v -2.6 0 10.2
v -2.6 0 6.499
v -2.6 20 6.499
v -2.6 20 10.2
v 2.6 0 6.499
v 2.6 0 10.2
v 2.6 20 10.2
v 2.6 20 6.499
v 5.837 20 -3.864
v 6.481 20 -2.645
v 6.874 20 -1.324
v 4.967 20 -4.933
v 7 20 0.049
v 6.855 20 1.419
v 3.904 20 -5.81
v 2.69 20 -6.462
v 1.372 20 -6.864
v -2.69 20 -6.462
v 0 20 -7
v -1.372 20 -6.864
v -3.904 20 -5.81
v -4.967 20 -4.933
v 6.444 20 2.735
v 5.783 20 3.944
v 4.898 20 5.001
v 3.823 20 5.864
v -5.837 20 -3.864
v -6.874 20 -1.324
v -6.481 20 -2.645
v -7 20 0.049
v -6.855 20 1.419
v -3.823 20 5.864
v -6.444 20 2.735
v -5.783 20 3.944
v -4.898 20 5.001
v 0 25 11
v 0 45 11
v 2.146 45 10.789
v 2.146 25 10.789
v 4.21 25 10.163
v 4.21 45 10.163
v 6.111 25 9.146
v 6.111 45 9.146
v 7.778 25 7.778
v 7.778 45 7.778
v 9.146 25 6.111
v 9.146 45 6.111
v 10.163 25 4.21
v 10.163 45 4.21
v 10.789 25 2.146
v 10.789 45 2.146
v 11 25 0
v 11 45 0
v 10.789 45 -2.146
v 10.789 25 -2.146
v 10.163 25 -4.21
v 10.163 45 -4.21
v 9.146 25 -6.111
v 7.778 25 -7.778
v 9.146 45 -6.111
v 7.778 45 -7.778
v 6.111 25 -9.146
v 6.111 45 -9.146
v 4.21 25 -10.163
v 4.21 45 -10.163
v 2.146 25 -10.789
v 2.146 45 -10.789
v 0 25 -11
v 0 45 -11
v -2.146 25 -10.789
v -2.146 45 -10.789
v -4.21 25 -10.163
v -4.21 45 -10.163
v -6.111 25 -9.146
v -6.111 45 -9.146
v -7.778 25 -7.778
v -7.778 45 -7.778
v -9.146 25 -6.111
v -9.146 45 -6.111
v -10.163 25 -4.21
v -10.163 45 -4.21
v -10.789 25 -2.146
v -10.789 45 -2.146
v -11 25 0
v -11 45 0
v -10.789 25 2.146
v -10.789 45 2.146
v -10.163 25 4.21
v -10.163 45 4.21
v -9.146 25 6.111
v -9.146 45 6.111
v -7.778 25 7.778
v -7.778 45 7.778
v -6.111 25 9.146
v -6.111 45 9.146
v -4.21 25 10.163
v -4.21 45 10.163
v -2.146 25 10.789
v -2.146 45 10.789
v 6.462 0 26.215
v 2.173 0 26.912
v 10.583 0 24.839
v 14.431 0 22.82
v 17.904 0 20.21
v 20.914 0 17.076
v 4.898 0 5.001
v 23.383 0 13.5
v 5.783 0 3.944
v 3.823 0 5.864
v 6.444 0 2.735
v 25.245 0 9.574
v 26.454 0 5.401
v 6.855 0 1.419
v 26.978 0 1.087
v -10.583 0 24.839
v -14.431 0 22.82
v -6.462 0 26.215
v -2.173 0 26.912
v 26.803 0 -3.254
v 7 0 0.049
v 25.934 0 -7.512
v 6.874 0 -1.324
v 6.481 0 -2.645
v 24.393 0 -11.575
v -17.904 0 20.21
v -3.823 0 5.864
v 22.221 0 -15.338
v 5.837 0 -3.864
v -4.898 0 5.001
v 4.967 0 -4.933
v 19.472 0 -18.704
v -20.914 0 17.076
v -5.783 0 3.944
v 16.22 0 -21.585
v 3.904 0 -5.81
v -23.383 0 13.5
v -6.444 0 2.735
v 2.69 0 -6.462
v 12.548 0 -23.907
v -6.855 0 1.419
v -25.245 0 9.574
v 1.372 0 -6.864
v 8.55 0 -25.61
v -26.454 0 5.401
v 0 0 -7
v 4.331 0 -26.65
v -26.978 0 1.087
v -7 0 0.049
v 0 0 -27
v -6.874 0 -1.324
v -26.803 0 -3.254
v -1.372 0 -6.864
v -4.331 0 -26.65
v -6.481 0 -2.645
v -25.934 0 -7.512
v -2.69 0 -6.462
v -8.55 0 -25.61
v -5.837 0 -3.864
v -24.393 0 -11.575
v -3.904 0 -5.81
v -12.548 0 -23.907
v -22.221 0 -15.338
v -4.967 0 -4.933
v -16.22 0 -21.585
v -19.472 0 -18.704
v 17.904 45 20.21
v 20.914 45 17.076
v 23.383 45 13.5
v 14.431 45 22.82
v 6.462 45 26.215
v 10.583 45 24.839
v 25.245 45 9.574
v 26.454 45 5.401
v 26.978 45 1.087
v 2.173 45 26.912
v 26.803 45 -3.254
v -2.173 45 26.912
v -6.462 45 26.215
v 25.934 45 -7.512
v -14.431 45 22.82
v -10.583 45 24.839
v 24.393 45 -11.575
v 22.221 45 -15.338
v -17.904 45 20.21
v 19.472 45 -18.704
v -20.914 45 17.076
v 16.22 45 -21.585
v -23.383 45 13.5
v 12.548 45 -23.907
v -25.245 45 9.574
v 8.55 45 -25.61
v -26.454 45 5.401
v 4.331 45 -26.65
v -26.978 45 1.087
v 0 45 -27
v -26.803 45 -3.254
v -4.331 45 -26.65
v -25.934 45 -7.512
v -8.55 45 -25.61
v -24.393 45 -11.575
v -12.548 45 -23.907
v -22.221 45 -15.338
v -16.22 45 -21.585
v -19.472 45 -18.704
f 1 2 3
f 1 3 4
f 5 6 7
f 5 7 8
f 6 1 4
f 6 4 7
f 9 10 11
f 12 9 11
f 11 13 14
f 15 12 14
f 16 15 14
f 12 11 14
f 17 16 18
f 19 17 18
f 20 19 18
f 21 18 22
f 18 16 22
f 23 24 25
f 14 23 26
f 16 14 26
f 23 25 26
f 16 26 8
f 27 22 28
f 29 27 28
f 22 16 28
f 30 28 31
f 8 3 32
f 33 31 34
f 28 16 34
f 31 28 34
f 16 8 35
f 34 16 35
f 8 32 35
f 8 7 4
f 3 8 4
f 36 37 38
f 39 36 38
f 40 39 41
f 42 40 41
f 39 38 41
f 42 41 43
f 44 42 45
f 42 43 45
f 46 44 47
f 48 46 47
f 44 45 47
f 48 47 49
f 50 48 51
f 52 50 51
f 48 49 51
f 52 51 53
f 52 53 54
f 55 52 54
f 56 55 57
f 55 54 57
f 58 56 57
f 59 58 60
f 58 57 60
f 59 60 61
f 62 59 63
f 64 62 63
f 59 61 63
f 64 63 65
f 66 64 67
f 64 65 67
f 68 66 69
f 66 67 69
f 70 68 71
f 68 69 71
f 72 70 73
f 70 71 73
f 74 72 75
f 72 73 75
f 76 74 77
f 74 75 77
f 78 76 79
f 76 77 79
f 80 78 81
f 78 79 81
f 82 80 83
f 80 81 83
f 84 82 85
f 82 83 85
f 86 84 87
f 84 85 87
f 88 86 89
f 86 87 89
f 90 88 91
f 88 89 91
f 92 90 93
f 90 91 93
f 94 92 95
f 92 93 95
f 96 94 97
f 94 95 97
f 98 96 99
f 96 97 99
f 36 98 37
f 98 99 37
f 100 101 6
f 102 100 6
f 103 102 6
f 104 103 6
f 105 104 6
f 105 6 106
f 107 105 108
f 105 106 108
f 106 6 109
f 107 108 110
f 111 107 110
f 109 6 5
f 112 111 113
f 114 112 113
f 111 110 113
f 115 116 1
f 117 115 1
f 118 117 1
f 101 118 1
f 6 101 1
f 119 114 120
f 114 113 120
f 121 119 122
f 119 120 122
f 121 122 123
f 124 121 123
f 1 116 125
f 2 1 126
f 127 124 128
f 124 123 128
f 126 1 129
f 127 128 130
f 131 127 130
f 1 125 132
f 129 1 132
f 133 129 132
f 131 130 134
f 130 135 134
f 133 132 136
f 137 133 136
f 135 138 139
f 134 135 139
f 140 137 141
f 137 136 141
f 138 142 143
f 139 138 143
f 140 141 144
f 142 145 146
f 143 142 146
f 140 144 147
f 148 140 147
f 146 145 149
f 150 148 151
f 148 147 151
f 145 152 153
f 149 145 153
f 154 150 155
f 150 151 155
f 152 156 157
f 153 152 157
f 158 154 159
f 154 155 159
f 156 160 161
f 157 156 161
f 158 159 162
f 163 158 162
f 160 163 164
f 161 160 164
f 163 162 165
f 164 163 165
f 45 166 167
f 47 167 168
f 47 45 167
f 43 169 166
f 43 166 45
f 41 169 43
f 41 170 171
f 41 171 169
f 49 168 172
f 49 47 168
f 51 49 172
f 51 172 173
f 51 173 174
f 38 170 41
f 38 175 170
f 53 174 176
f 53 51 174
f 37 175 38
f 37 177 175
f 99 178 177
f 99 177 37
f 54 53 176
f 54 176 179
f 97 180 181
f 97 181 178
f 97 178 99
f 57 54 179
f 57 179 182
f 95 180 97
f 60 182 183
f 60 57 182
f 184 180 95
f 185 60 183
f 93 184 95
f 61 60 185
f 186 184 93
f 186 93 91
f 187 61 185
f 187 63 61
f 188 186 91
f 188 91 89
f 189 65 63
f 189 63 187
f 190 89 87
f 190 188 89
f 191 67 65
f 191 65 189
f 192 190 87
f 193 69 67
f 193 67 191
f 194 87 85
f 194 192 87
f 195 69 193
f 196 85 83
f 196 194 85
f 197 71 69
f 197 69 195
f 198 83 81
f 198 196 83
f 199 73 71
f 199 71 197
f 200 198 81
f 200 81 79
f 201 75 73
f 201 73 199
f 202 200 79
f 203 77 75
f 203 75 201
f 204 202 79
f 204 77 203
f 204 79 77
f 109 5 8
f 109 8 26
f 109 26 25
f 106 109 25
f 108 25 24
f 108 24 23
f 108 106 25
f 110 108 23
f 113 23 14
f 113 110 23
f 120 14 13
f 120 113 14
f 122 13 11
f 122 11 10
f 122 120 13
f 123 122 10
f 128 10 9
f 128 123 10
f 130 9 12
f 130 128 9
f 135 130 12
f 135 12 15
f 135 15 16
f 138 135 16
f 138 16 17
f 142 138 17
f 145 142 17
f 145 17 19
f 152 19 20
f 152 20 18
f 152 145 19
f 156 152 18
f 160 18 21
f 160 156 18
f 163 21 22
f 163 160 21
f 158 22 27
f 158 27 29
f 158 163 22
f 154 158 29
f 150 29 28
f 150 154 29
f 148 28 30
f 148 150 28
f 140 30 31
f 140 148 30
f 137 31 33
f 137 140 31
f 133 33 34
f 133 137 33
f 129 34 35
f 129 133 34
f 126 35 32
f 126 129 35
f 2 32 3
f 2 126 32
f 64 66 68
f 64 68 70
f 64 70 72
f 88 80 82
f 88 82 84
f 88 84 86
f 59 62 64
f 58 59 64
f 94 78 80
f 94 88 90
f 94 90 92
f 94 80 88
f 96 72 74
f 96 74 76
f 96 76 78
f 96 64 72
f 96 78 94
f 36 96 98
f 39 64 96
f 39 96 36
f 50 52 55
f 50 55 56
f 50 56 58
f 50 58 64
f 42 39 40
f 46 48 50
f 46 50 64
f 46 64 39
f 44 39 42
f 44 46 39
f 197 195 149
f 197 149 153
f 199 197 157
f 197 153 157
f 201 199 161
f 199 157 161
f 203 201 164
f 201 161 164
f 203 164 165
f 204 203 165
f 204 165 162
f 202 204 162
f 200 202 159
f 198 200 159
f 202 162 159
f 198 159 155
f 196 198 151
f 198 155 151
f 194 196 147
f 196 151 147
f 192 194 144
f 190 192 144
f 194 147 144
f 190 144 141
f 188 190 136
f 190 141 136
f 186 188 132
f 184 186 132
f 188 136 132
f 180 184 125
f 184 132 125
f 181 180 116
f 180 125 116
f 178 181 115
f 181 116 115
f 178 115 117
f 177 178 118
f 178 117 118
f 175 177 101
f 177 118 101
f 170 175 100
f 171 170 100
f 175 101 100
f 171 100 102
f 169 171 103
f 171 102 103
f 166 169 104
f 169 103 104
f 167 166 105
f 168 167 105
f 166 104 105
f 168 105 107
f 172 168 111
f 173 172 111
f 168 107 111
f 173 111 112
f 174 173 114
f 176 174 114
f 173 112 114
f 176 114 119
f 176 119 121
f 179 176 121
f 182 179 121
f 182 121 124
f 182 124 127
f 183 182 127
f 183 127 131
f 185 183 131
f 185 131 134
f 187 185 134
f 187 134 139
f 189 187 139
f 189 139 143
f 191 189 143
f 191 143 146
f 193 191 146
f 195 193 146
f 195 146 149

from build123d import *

# Parameters (mm, degrees)
SKETCH_1_R          = 27
EXTRUDE_1_DEPTH     = 45
SKETCH_2_R          = 11
CUT_EXTRUDE_1_DEPTH = 20
CUT_EXTRUDE_2_DEPTH = 20


with BuildPart() as part:
    # 草图1 → 凸台-拉伸1 (new body)
    with BuildSketch(Plane(origin=(0, 0, 0), x_dir=(1, 0, 0), z_dir=(0, 1, 0))):
        with Locations(Location((0, 0, 0), (0, 0, 90))):
            Circle(SKETCH_1_R)
    extrude(amount=EXTRUDE_1_DEPTH)

    # 草图2 → 切除-拉伸1 (cut)
    with BuildSketch(Plane(origin=(0, 45, 0), x_dir=(1, 0, 0), z_dir=(0, 1, 0))):
        with Locations(Location((0, 0, 0), (0, 0, 270))):
            Circle(SKETCH_2_R)
    extrude(amount=-CUT_EXTRUDE_1_DEPTH, mode=Mode.SUBTRACT)

    # 草图3 → 切除-拉伸2 (cut)
    with BuildSketch(Plane.XZ):
        with BuildLine():
            Line((-2.6, 10.2), (2.6, 10.2))
            Line((2.6, 10.2), (2.6, 6.499230724))
            ThreePointArc((2.6, 6.499230724), (0, -7), (-2.6, 6.499230724))
            Line((-2.6, 6.499230724), (-2.6, 10.2))
        make_face()
    extrude(amount=-CUT_EXTRUDE_2_DEPTH, mode=Mode.SUBTRACT)


solid = part.part
